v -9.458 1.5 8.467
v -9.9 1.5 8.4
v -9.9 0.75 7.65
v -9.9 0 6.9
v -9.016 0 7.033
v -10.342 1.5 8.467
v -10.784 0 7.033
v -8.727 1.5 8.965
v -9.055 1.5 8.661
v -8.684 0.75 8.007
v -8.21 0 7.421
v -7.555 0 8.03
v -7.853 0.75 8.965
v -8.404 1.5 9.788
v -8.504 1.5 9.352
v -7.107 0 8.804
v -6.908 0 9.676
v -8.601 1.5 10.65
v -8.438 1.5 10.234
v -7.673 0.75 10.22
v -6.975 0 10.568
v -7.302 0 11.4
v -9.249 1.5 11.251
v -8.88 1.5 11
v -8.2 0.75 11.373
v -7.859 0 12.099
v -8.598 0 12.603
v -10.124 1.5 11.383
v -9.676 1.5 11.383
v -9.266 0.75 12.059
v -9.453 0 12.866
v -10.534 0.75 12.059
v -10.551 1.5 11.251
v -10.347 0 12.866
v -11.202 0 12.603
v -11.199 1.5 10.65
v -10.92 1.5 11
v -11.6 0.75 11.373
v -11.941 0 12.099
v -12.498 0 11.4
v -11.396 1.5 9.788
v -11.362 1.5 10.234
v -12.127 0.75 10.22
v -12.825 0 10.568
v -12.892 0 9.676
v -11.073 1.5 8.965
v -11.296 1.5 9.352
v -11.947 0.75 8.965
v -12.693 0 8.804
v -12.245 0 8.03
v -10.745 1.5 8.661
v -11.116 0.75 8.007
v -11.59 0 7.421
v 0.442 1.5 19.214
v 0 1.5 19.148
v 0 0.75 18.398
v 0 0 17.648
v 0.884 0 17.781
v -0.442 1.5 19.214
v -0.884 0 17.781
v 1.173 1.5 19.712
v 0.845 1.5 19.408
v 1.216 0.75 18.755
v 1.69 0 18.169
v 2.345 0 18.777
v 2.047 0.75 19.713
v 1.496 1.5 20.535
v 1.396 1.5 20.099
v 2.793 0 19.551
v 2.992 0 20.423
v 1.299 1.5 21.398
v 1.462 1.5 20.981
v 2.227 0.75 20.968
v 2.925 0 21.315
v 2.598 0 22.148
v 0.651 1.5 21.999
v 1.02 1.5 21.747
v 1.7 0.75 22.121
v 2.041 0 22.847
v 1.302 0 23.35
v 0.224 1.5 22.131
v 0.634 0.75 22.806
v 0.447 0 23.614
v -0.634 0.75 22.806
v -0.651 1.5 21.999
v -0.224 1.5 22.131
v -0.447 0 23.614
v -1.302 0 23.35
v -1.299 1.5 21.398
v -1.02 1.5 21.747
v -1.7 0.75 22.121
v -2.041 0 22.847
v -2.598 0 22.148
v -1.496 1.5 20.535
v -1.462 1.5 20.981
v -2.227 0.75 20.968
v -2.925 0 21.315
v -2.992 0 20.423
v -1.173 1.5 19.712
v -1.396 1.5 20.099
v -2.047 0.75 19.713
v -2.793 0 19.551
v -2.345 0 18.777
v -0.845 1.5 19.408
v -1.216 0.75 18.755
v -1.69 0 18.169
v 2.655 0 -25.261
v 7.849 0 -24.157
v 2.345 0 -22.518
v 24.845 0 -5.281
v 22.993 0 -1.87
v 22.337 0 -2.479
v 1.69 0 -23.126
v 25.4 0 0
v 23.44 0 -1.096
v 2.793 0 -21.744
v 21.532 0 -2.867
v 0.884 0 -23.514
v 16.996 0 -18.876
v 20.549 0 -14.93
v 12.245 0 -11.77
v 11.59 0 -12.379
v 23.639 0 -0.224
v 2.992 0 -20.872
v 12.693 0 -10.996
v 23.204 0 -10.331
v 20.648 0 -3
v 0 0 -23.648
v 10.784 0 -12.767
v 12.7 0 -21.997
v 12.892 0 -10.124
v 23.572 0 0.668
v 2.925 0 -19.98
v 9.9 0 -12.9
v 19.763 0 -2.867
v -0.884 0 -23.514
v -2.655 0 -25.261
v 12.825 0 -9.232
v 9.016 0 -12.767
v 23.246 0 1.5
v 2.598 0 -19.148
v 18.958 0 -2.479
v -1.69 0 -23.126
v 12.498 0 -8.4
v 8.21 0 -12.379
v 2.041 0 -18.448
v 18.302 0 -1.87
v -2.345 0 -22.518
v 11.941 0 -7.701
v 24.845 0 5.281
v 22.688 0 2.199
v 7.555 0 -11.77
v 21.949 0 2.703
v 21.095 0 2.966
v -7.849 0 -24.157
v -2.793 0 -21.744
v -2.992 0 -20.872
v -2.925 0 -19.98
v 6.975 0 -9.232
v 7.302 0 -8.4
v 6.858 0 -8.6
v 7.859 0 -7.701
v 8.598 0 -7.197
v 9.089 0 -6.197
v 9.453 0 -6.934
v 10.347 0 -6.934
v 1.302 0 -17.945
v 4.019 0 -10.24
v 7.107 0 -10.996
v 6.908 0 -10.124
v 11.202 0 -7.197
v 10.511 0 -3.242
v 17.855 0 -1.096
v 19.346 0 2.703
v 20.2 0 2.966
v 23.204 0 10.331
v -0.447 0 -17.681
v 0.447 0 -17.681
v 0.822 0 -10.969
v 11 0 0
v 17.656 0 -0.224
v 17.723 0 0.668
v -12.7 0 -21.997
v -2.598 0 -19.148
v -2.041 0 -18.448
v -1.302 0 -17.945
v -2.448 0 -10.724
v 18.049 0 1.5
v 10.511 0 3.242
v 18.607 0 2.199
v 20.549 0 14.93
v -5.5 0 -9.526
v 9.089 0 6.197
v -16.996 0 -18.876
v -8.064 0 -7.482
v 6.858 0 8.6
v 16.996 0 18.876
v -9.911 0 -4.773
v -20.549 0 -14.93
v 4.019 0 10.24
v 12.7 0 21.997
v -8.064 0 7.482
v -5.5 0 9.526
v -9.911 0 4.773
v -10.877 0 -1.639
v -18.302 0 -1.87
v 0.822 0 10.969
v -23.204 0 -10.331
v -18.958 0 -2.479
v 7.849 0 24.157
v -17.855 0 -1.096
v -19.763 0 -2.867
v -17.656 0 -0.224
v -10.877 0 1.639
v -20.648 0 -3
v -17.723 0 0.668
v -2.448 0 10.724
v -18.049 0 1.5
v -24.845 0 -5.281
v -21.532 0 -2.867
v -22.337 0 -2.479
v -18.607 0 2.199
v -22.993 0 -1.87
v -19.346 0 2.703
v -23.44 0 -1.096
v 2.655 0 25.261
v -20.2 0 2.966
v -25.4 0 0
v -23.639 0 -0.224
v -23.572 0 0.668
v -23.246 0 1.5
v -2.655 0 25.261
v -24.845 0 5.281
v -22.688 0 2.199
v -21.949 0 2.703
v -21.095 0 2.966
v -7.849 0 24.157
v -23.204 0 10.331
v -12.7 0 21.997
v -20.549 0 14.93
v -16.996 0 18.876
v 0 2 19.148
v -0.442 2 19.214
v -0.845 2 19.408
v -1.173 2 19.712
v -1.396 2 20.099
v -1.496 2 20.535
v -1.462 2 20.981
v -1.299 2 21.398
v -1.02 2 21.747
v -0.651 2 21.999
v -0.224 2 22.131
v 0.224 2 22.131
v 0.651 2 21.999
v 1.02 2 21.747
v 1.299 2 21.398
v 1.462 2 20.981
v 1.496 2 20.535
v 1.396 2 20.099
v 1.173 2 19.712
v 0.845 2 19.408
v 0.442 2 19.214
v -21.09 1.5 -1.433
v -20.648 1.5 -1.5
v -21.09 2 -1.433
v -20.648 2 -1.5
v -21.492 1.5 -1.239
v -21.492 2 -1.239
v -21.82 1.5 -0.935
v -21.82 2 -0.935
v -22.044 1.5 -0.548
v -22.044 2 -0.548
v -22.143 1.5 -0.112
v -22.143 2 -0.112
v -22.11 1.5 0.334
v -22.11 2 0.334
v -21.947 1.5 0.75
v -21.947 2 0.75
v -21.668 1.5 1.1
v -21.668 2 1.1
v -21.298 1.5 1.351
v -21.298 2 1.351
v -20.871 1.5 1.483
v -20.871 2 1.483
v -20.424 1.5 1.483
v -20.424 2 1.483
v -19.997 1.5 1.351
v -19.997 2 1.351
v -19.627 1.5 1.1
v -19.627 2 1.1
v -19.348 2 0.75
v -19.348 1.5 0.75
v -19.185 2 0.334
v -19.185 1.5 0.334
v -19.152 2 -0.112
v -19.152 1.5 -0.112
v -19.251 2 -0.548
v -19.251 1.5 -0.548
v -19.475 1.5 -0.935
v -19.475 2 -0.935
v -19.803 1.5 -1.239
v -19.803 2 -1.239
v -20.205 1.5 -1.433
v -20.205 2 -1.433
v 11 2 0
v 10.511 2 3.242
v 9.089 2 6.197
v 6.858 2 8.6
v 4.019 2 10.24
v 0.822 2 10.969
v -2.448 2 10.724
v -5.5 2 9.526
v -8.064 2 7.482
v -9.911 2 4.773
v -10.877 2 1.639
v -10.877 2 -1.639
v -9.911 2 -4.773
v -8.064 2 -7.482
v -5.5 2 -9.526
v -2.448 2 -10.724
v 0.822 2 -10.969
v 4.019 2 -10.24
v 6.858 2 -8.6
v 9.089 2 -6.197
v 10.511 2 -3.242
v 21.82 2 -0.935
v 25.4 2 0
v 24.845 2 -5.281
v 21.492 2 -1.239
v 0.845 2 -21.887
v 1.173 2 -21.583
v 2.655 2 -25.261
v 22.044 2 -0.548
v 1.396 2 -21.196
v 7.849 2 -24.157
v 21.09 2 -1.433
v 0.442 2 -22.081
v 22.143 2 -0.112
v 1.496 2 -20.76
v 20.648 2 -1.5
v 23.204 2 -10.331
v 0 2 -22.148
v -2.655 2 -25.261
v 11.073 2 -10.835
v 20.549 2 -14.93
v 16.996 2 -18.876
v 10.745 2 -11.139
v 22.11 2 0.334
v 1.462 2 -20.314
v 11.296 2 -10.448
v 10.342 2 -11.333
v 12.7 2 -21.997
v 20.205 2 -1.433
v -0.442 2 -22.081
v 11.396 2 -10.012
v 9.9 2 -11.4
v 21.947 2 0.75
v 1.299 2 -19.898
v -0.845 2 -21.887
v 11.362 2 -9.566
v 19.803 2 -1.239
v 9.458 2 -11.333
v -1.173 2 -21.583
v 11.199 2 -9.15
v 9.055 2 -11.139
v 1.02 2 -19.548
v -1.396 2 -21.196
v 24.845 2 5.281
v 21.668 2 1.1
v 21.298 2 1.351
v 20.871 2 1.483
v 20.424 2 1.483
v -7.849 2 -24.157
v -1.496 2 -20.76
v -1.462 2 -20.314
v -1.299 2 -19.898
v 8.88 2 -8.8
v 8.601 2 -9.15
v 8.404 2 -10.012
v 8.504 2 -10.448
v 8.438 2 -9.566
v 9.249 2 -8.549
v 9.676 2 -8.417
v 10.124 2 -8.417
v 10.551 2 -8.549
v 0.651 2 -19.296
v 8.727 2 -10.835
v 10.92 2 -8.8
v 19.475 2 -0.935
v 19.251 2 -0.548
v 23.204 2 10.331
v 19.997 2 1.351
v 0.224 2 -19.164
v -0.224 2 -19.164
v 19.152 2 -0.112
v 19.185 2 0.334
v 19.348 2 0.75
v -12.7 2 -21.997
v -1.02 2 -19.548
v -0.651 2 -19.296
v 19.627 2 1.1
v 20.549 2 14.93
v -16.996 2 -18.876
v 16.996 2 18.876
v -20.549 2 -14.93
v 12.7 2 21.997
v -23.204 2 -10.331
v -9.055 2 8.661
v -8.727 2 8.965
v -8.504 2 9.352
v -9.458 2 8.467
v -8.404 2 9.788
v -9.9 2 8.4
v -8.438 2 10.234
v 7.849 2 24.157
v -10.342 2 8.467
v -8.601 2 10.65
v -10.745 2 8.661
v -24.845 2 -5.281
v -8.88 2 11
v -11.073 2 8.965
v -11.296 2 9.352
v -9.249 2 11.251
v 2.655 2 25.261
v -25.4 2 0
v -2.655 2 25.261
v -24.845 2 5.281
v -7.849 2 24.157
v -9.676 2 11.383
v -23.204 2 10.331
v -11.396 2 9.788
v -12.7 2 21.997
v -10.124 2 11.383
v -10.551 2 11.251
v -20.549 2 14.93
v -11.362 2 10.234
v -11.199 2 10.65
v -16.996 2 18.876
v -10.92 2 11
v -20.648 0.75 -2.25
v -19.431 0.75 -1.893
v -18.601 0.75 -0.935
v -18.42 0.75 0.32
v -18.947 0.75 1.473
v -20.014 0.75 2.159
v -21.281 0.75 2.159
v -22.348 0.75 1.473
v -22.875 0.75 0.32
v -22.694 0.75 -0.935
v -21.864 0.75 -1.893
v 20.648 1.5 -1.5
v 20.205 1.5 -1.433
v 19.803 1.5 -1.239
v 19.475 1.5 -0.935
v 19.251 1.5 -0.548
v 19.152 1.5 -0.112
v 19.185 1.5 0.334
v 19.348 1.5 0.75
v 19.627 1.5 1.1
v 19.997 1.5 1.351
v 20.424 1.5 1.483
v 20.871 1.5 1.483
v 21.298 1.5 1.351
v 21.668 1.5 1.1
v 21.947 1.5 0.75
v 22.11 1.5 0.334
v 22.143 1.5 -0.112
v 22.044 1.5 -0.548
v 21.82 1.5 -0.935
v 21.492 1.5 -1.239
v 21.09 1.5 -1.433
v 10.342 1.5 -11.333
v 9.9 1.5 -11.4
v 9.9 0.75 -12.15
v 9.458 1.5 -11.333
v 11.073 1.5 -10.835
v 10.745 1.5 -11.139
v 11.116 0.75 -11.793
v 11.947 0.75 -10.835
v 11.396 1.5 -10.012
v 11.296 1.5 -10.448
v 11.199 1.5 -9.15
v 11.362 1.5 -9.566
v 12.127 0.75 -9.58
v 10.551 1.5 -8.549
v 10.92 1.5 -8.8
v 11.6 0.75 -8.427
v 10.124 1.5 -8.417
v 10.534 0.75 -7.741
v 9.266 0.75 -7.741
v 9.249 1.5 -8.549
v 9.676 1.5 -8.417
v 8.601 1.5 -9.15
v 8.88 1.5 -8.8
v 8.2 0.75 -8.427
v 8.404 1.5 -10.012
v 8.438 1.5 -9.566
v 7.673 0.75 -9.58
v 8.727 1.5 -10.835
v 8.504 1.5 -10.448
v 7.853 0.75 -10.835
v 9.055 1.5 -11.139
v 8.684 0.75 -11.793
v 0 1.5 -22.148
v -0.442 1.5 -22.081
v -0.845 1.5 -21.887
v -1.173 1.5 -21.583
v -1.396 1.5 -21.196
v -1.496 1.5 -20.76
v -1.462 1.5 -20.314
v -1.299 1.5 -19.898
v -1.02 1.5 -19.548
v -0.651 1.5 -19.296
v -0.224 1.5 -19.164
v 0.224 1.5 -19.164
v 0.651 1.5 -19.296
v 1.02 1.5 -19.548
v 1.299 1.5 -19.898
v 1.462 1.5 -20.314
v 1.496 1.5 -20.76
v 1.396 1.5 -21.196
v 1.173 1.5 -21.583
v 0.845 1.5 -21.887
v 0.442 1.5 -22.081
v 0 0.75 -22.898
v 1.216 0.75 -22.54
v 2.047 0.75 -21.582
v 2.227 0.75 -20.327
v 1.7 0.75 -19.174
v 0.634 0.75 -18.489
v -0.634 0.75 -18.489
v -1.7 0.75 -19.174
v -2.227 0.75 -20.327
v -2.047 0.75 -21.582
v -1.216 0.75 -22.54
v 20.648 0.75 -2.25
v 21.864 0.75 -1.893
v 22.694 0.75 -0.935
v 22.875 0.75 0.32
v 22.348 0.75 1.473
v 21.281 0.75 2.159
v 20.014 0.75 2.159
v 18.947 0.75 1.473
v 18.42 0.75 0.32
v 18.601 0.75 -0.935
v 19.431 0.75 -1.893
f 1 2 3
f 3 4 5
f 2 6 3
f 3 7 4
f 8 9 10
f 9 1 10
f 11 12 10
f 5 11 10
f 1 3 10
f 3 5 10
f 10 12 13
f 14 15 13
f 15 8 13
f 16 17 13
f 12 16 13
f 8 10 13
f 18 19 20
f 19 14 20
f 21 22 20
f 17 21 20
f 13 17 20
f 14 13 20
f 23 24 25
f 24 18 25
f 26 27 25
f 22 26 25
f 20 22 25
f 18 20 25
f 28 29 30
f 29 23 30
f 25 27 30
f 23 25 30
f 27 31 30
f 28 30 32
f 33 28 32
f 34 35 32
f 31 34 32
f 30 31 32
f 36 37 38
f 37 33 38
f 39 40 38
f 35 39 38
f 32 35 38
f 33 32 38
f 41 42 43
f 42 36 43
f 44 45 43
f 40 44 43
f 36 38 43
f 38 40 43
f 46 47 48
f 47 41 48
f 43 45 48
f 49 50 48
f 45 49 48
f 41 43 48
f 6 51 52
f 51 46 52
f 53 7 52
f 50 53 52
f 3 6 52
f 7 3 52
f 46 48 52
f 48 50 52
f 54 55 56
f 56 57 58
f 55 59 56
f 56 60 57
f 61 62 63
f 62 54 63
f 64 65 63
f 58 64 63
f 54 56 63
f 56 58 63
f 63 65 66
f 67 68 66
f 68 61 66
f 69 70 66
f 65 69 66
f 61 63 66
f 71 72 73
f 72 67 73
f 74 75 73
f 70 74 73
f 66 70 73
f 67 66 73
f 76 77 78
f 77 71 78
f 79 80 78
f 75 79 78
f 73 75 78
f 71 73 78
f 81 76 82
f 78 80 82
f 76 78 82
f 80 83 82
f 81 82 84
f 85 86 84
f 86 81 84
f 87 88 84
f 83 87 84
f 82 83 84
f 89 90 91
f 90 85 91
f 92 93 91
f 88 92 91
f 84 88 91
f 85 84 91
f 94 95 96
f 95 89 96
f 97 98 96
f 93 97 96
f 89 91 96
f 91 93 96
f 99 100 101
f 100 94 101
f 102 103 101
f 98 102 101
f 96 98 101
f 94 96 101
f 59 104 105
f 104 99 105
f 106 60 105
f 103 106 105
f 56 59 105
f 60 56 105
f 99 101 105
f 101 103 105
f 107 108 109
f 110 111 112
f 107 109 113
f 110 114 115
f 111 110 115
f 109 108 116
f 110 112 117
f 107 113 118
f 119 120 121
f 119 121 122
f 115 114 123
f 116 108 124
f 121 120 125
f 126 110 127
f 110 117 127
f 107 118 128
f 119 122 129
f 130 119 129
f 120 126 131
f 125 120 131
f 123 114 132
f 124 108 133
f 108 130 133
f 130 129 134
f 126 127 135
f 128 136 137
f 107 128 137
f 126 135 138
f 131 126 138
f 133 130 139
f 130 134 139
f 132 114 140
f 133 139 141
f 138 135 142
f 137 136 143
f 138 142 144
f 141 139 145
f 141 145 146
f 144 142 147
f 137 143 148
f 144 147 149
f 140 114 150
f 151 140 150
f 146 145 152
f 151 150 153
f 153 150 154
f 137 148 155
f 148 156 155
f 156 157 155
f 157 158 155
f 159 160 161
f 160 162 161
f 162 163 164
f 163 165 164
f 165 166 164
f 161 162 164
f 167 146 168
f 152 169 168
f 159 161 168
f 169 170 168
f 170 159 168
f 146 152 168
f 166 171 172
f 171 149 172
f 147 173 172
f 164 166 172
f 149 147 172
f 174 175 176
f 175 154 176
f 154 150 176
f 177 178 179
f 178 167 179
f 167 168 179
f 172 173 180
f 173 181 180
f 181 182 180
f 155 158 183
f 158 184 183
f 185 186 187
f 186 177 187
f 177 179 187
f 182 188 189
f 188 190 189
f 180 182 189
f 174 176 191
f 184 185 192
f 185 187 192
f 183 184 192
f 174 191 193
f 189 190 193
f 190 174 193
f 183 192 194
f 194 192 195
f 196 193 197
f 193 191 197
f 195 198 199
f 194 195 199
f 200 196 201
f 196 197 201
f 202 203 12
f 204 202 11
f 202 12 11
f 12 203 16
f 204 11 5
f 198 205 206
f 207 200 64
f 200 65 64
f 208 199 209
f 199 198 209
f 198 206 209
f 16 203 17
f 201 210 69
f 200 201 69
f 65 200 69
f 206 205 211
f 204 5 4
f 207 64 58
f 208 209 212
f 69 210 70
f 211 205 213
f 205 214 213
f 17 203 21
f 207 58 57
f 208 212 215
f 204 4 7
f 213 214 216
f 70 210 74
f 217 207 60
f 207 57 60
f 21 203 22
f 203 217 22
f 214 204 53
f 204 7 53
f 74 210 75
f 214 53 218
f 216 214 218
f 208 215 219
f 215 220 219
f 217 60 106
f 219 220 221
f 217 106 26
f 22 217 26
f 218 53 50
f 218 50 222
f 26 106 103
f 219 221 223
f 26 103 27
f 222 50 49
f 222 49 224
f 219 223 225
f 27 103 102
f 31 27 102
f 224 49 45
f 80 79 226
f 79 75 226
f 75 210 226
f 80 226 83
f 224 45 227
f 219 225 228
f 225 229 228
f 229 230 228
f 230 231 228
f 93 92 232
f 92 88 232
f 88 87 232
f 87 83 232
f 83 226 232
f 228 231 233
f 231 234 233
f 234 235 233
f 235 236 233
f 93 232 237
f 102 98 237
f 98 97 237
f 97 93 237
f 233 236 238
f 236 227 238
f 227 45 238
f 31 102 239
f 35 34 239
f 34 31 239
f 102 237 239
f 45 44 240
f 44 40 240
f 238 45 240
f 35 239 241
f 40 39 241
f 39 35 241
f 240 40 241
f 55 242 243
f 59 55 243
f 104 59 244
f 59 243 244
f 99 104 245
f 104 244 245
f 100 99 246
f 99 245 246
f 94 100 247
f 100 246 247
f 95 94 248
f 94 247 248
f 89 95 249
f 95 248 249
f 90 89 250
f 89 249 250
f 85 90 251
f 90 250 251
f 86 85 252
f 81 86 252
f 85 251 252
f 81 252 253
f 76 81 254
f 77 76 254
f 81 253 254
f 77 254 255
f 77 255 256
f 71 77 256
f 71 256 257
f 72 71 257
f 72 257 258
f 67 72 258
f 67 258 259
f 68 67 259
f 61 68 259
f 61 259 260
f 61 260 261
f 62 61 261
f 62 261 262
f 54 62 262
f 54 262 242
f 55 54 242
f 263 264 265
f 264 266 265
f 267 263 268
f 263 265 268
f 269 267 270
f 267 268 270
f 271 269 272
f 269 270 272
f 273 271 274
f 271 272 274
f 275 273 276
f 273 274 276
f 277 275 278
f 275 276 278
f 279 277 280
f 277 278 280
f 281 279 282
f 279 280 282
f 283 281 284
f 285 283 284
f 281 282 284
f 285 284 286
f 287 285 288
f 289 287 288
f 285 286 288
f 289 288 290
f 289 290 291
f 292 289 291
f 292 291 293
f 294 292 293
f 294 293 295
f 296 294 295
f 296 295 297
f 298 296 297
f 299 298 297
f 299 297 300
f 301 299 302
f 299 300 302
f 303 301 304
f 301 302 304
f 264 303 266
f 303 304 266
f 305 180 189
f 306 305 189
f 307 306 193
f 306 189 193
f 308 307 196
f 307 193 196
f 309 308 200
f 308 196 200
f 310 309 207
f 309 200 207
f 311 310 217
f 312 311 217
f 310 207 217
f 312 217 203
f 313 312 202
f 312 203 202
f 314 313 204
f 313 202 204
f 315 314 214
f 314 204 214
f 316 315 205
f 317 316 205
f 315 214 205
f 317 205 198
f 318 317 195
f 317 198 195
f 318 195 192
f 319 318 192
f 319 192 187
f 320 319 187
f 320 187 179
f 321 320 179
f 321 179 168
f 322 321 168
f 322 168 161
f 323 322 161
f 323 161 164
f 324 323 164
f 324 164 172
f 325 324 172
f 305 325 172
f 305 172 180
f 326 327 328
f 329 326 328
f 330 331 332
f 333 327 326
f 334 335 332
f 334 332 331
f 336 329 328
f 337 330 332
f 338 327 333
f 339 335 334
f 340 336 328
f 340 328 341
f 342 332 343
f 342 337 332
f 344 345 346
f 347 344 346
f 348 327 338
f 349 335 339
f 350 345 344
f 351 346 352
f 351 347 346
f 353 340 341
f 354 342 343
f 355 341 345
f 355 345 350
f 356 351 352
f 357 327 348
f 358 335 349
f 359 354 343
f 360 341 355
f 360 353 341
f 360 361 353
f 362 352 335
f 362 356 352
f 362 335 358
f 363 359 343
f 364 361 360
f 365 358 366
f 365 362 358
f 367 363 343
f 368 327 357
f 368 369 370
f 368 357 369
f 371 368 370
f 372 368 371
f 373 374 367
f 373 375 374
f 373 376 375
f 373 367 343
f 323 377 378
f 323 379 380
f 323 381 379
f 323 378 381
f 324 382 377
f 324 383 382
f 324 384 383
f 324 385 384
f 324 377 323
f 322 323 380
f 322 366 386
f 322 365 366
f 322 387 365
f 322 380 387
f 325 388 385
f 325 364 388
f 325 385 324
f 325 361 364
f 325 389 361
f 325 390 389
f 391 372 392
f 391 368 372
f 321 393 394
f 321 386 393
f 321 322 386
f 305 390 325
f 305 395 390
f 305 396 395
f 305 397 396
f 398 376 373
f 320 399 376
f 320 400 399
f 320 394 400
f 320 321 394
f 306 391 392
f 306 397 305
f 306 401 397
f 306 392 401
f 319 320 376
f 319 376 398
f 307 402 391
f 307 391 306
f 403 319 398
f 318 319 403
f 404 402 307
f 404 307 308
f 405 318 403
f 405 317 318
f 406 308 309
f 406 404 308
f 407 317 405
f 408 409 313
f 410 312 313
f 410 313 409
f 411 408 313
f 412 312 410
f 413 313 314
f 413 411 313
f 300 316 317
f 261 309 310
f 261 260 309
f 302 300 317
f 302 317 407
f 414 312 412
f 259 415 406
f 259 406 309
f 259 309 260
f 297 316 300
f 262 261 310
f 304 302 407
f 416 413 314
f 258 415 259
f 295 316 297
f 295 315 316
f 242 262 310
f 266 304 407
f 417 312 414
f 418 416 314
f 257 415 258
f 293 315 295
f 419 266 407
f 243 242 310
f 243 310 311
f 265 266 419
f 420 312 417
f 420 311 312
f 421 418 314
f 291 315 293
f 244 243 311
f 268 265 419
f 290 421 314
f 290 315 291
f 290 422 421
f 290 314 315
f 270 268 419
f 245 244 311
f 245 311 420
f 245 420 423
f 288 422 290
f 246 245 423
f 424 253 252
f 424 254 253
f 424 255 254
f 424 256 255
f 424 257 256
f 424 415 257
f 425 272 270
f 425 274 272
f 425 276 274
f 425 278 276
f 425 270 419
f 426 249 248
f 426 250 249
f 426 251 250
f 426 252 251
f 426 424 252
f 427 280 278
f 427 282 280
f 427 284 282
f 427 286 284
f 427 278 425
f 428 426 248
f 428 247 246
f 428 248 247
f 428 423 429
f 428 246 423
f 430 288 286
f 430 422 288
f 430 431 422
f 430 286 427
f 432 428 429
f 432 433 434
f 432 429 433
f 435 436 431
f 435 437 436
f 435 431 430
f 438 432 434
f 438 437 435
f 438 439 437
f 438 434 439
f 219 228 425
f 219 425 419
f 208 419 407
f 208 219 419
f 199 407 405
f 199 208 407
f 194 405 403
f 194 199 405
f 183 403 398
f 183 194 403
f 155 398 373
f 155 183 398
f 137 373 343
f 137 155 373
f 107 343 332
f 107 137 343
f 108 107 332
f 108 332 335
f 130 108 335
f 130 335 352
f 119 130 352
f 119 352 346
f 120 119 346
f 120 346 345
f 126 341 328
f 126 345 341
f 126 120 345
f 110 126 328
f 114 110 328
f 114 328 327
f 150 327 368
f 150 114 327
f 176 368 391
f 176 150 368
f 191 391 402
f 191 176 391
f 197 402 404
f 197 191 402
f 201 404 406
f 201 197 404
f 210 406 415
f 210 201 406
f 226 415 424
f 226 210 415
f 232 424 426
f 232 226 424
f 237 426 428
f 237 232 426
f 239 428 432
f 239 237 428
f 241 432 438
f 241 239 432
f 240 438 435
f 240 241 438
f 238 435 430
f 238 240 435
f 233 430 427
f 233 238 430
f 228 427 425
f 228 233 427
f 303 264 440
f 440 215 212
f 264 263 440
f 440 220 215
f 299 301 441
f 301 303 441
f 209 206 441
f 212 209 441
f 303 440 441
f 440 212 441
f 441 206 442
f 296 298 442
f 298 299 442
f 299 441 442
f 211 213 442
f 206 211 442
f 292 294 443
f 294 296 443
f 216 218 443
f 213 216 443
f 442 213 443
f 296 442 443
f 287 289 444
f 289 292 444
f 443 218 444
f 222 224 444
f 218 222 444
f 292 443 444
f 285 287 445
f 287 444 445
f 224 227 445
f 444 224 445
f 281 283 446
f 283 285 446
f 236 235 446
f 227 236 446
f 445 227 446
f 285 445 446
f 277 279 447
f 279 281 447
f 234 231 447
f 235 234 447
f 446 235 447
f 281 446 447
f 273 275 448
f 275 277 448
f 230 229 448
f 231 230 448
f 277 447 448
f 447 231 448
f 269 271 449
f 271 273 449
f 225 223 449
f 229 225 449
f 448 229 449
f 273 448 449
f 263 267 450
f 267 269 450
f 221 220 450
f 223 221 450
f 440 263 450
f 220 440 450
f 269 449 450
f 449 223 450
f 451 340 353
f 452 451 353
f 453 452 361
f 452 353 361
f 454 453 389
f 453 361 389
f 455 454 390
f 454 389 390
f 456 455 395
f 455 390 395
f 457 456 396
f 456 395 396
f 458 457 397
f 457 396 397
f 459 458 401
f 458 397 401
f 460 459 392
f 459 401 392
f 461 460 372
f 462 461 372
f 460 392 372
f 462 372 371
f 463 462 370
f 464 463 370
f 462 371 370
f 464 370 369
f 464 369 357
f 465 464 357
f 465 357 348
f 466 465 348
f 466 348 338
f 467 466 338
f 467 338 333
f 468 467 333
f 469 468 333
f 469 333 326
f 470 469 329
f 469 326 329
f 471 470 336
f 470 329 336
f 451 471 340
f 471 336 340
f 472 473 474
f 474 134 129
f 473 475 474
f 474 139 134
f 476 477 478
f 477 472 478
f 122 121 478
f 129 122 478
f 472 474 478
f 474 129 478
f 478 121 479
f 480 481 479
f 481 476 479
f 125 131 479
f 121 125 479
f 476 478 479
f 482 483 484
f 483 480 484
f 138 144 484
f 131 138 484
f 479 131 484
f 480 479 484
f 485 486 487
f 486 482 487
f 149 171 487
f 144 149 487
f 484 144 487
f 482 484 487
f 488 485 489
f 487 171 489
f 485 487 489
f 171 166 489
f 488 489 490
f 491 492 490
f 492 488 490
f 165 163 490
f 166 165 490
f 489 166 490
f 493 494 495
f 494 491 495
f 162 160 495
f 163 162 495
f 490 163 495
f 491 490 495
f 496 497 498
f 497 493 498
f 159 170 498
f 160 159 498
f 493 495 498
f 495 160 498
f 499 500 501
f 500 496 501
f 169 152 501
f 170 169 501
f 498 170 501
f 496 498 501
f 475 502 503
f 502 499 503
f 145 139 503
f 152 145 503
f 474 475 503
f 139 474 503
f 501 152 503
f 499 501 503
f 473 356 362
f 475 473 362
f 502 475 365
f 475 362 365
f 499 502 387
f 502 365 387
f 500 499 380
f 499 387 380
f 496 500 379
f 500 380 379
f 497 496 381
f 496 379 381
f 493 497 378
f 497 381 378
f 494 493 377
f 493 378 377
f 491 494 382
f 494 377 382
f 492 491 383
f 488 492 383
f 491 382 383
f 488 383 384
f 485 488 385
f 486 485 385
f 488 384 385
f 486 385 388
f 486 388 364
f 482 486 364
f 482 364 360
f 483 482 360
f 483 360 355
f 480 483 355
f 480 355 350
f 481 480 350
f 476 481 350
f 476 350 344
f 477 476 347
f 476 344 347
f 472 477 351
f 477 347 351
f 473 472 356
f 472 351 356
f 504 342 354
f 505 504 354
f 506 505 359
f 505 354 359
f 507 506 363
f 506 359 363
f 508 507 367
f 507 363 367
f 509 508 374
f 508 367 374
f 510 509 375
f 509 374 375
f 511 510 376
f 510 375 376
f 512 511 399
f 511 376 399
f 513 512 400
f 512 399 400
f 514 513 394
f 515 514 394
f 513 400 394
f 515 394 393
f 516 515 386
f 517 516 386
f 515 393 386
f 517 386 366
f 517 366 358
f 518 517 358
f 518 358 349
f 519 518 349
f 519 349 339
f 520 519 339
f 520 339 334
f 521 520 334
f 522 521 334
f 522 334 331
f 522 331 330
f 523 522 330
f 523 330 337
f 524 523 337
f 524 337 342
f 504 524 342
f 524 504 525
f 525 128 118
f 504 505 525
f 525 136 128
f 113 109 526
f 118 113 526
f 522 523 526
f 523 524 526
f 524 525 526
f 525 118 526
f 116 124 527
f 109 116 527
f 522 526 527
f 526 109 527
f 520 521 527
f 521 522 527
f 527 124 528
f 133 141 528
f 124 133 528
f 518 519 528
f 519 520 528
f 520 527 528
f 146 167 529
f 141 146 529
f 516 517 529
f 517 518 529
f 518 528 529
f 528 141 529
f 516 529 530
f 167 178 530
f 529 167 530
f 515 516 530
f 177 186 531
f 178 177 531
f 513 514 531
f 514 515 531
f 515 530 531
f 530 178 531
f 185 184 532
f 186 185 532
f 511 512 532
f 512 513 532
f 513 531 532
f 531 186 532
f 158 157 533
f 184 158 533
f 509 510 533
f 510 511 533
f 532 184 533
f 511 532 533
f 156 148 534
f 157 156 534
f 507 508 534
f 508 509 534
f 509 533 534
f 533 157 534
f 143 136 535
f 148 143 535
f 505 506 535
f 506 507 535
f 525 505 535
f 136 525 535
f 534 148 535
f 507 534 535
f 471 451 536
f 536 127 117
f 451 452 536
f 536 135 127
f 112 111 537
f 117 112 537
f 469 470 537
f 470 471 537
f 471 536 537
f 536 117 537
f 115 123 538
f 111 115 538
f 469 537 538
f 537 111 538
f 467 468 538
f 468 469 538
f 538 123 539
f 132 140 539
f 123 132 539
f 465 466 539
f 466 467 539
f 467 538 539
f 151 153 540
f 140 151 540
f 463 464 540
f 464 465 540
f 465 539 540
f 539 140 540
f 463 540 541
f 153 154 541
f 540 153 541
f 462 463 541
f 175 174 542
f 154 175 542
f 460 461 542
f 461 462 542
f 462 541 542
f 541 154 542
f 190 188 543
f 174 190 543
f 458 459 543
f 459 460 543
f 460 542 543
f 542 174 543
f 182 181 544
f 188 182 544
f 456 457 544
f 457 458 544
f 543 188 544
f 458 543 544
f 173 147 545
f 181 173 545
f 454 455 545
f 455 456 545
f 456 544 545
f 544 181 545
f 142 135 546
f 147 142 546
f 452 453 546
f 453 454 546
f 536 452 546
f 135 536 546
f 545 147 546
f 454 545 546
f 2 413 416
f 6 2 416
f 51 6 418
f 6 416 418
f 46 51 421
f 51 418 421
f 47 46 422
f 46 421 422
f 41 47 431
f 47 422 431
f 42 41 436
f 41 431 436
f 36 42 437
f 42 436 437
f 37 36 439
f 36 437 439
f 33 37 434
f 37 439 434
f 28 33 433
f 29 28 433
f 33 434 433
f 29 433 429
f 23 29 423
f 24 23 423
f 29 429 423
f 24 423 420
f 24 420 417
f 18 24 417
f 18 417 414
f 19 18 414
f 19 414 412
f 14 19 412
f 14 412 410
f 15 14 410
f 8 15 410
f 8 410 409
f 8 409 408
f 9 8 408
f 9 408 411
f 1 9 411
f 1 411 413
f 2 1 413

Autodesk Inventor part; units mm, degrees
ref_plane "YZ Plane" through (0, 0, 0) normal (1, 0, 0) x (0, 1, 0)
ref_plane "XZ Plane" through (0, 0, 0) normal (0, 1, 0) x (-1, 0, 0)
ref_plane "XY Plane" through (0, 0, 0) normal (0, 0, 1) x (1, 0, 0)
sketch "Skizze1" plane through (0, 0, 0) normal (0, 1, 0) x (-1, 0, 0)
  circle A0 centre (0, 0) radius 25.4
  dimension "d0" = 50.8
extrude "Extrusion1" add sketch "Skizze1" along normal blind 2
sketch "Skizze2" plane through (0, 0, 0) normal (0, -1, 0) x (1, 0, 0)
  circle A0 centre (0, 0) radius 25.4 projected
  line L0 (-20.6475, 0) -> (0, 20.6475) construction
  line L1 (0, 20.6475) -> (20.6475, 0) construction
  line L2 (20.6475, 0) -> (0, -20.6475) construction
  line L3 (0, -20.6475) -> (-20.6475, 0) construction
  line L4 (0, 0) -> (10.3238, 10.3238) construction
  line L5 (0, 0) -> (-10.3238, 10.3238) construction
  circle A1 centre (0, 0) radius 25.4 construction
  line L6 (0, 0) -> (0, 25.4) construction
  point P0 (-20.6475, 0)
  point P1 (0, 20.6475)
  point P2 (20.6475, 0)
  dimension "d3" = 29.2
  dimension "d4" = 29.2
  dimension "d63" = 45
hole "Bohrung1" at (-20.6475, 0, 0) at (0, 0, 20.6475) at (20.6475, 0, 0) at (0, 0, -20.6475) direction (0, 1, 0) diameter 3 end through all countersink diameter 6 countersink angle 90
sketch "Skizze9" plane through (0, 0, 0) normal (0, -1, 0) x (1, 0, 0)
  circle A0 centre (0, 0) radius 25.4 projected
  circle A1 centre (0, 0) radius 11
  dimension "d53" = 22
extrude "Extrusion7" cut sketch "Skizze9" against normal up to next contours A1
sketch "Skizze7" plane through (0, 0, 0) normal (0, -1, 0) x (1, 0, 0)
  circle A0 centre (0, 0) radius 25.4 construction
  line L0 (-9.9, 9.9) -> (9.9, 9.9) construction
  line L1 (9.9, 9.9) -> (9.9, -9.9) construction
  line L2 (9.9, -9.9) -> (-9.9, -9.9) construction
  line L3 (-9.9, -9.9) -> (-9.9, 9.9) construction
  line L4 (-9.9, 0) -> (9.9, 0) construction
  dimension "d42" = 19.8
  dimension "d43" = 19.8
hole "Bohrung3" at (-9.9, 0, 9.9) at (9.9, 0, -9.9) direction (0, 1, 0) diameter 3 end through all countersink diameter 6 countersink angle 90
sketch "Skizze10" plane through (0, 0, 0) normal (0, -1, 0) x (1, 0, 0)
  circle A0 centre (0, 0) radius 25.4 projected
  line L0 (-12.55, 16.2) -> (12.55, 16.2)
  line L1 (12.55, 16.2) -> (12.55, -12.5)
  line L2 (12.55, -12.5) -> (-12.55, -12.5)
  line L3 (-12.55, -12.5) -> (-12.55, 16.2)
  line L4 (0, 16.2) -> (0, -12.5) construction
  line L5 (-7, -12.5) -> (-5, -12.5) construction
  line L6 (-5, -12.5) -> (-5, -14.5)
  line L7 (-5, -14.5) -> (-7, -14.5)
  line L8 (-7, -14.5) -> (-7, -12.5)
  line L9 (5, -12.5) -> (7, -12.5) construction
  line L10 (7, -12.5) -> (7, -14.5)
  line L11 (7, -14.5) -> (5, -14.5)
  line L12 (5, -14.5) -> (5, -12.5)
  line L13 (-5, -12.5) -> (5, -12.5) construction
  dimension "d56" = 25.1
  dimension "d57" = 28.7
  dimension "d58" = 12.5
  dimension "d59" = 2
  dimension "d60" = 2
  dimension "d61" = 10
  dimension "d62" = 2
properties part number "anschluss_daten"
